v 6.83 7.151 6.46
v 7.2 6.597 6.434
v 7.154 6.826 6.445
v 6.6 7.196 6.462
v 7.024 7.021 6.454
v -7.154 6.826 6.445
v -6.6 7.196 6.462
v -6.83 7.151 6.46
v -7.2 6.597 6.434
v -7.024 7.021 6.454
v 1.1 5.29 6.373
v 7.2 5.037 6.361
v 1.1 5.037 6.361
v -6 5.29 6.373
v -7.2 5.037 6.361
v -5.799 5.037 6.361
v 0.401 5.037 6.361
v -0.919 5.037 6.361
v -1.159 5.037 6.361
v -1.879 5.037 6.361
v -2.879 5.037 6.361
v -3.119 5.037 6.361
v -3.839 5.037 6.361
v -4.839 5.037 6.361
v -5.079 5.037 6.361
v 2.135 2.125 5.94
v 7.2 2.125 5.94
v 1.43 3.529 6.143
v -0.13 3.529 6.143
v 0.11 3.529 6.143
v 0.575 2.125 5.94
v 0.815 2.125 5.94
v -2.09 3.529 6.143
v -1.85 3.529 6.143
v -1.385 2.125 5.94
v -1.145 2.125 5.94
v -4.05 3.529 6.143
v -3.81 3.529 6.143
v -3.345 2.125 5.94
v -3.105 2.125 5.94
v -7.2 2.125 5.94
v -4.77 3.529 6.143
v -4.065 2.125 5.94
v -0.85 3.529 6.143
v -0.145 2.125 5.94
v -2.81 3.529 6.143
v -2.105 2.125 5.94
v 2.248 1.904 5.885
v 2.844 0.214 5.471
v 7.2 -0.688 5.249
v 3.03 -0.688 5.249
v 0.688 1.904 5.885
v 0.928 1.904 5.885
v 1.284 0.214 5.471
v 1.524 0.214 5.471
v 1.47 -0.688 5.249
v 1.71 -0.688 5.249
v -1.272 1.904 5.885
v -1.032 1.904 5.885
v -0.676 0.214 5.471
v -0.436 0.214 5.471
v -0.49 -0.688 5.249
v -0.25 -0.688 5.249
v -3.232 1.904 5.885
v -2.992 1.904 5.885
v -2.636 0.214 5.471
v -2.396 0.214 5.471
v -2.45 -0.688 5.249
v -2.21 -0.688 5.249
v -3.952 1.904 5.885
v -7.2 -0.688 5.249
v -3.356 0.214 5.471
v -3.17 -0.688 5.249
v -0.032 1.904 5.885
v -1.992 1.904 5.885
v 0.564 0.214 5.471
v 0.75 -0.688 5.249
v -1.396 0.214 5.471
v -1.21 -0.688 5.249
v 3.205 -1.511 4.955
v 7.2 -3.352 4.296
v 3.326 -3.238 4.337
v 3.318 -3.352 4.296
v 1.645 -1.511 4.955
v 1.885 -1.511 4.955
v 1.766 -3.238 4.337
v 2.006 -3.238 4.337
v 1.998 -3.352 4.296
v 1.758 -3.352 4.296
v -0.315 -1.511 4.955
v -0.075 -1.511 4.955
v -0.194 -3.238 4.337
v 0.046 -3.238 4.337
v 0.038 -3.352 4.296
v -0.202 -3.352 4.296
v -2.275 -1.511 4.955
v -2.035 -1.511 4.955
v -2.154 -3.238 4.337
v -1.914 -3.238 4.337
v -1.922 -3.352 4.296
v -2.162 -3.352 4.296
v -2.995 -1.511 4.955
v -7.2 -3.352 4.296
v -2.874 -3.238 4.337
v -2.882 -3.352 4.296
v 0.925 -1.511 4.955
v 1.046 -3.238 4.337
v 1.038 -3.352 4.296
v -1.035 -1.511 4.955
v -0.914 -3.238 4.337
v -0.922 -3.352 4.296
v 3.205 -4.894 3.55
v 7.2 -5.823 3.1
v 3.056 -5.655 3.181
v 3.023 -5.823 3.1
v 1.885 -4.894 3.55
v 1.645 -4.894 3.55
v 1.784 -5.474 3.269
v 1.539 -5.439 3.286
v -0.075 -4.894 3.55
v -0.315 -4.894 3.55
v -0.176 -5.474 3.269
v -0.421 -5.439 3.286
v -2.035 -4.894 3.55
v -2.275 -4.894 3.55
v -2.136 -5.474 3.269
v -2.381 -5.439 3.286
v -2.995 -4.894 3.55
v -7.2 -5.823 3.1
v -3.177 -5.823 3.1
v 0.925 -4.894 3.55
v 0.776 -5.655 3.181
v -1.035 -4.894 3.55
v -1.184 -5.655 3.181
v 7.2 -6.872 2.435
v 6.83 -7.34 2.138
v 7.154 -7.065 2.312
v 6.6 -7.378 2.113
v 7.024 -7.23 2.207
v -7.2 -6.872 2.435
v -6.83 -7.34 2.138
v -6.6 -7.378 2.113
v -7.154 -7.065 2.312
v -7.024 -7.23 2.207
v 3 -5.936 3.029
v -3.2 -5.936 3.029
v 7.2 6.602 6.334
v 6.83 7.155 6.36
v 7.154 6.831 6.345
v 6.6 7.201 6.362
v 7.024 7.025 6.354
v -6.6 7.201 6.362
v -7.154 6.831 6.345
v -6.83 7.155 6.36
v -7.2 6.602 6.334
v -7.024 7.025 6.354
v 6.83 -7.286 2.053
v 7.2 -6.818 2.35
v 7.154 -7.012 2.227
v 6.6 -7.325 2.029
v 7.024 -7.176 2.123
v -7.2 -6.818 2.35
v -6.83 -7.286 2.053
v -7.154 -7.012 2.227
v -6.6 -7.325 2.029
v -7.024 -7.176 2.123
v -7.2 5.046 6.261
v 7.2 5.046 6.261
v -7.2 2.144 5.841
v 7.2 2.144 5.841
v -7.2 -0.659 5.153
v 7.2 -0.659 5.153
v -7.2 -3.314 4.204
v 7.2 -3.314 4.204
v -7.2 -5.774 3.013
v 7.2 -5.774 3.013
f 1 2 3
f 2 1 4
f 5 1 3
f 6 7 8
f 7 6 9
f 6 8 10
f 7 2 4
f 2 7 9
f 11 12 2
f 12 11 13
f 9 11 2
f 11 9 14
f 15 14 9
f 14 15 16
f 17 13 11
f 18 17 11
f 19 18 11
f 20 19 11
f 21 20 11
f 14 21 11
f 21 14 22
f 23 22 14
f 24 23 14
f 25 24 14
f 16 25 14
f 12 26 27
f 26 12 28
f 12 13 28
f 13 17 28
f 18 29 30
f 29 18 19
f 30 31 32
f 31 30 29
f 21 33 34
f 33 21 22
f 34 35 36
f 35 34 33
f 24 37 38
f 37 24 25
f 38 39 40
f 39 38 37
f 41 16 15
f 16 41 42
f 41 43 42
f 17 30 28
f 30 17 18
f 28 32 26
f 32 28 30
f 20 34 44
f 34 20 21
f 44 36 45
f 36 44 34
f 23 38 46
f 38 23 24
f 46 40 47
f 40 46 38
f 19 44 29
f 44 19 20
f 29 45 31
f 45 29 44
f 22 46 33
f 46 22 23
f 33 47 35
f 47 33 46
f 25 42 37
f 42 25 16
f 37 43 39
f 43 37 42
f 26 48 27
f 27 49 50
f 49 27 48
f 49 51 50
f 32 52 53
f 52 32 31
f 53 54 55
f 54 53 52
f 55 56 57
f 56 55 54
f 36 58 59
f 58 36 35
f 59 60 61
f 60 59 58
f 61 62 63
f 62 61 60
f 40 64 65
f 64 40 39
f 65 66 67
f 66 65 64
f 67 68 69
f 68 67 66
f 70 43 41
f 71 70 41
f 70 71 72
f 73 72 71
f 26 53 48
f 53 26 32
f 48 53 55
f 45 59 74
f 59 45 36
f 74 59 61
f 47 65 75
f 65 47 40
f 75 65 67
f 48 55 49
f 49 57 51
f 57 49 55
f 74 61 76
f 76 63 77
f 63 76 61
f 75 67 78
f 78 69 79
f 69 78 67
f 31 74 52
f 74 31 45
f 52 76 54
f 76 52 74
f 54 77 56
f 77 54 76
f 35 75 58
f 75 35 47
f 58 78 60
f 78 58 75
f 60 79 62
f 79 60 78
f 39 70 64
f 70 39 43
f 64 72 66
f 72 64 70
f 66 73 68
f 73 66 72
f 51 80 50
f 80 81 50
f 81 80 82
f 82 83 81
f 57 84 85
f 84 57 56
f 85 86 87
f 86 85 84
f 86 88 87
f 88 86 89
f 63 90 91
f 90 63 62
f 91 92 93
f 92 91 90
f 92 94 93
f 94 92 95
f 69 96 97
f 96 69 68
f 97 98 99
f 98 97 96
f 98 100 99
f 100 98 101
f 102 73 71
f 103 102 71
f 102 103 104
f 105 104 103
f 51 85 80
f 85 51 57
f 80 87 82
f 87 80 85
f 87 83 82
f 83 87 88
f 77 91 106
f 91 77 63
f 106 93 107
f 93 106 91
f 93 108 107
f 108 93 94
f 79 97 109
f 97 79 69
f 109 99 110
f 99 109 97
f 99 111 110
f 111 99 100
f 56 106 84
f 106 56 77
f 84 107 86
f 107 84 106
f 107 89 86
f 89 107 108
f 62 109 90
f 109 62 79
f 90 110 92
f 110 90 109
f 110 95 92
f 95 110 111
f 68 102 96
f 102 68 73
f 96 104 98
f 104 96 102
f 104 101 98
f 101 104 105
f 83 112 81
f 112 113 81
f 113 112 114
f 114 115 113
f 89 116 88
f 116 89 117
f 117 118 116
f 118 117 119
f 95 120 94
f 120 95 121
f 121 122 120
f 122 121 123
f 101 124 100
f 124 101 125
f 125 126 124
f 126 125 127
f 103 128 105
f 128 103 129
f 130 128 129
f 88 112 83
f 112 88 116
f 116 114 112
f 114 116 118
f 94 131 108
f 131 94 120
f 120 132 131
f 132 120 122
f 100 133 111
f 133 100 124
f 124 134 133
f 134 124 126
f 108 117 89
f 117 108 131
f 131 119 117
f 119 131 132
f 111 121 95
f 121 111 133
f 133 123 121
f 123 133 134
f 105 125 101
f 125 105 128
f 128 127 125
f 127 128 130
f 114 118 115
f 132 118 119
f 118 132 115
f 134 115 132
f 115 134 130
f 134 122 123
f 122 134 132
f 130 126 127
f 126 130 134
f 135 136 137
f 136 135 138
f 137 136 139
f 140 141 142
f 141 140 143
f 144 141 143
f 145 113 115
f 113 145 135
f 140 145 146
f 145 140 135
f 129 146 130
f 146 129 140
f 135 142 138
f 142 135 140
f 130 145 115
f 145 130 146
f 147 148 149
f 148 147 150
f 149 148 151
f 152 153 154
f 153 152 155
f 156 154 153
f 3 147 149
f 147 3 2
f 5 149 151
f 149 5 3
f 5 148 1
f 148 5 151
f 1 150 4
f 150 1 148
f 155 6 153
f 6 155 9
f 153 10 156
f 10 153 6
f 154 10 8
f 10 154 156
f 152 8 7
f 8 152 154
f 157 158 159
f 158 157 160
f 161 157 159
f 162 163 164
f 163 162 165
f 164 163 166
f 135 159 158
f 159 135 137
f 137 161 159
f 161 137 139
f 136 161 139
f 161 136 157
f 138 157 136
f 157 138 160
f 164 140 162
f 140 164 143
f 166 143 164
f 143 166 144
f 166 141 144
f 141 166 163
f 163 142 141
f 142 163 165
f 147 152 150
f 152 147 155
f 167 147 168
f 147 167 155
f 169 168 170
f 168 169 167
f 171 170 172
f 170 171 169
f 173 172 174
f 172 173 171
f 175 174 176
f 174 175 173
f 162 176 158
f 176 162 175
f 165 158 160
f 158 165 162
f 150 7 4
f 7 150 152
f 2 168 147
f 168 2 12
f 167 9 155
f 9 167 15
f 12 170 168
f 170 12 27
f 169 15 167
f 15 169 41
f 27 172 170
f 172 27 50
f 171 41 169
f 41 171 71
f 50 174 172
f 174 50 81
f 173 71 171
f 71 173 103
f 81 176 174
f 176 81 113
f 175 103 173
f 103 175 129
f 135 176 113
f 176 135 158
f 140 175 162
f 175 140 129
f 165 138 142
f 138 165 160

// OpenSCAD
// file: ../p/1-4cyli.scad
use <../lib.scad>
function ldraw_lib__1_4cyli() = [
// 0 Cylinder 0.25
// 0 Name: 1-4cyli.dat
// 0 Author: James Jessiman
// 0 !LDRAW_ORG Primitive UPDATE 2012-01
// 0 !LICENSE Licensed under CC BY 4.0 : see CAreadme.txt
// 
// 0 BFC CERTIFY CCW
  [0,"BFC","CERTIFY"],
  [0,"BFC","CCW"],
// 
// 0 !HISTORY 2002-03-23 [sbliss] Added BFC statement.
// 0 !HISTORY 2002-04-25 [PTadmin] Official Update 2002-02
// 0 !HISTORY 2007-06-22 [PTadmin] Header formatted for Contributor Agreement
// 0 !HISTORY 2008-07-01 [PTadmin] Official Update 2008-01
// 0 !HISTORY 2012-02-16 [Philo] Changed to CCW
// 0 !HISTORY 2012-03-30 [PTadmin] Official Update 2012-01
// 
// 
// 4 16 1 1 0 0.9239 1 0.3827 0.9239 0 0.3827 1 0 0
  [4,16,1,1,0,0.9239,1,0.3827,0.9239,0,0.3827,1,0,0],
// 5 24 1 0 0 1 1 0 0.9239 0 0.3827 1 0 -1
  [5,24,1,0,0,1,1,0,0.9239,0,0.3827,1,0,-1],
// 4 16 0.9239 1 0.3827 0.7071 1 0.7071 0.7071 0 0.7071 0.9239 0 0.3827
  [4,16,0.9239,1,0.3827,0.7071,1,0.7071,0.7071,0,0.7071,0.9239,0,0.3827],
// 5 24 0.9239 0 0.3827 0.9239 1 0.3827 0.7071 0 0.7071 1 0 0
  [5,24,0.9239,0,0.3827,0.9239,1,0.3827,0.7071,0,0.7071,1,0,0],
// 4 16 0.7071 1 0.7071 0.3827 1 0.9239 0.3827 0 0.9239 0.7071 0 0.7071
  [4,16,0.7071,1,0.7071,0.3827,1,0.9239,0.3827,0,0.9239,0.7071,0,0.7071],
// 5 24 0.7071 0 0.7071 0.7071 1 0.7071 0.3827 0 0.9239 0.9239 0 0.3827
  [5,24,0.7071,0,0.7071,0.7071,1,0.7071,0.3827,0,0.9239,0.9239,0,0.3827],
// 4 16 0.3827 1 0.9239 0 1 1 0 0 1 0.3827 0 0.9239
  [4,16,0.3827,1,0.9239,0,1,1,0,0,1,0.3827,0,0.9239],
// 5 24 0.3827 0 0.9239 0.3827 1 0.9239 0 0 1 0.7071 0 0.7071
  [5,24,0.3827,0,0.9239,0.3827,1,0.9239,0,0,1,0.7071,0,0.7071],
// 5 24 0 0 1 0 1 1 0.3827 0 0.9239 -1 0 1
  [5,24,0,0,1,0,1,1,0.3827,0,0.9239,-1,0,1],
];
module ldraw_lib__1_4cyli(step=0, col=false, unit=2/5, alt=false, line=0.2, solid=!$preview)
    makepoly(ldraw_lib__1_4cyli(), step=step, col=col, unit=unit, alt=alt, line=line, solid=solid);
ldraw_lib__1_4cyli(line=0.2);
// file: ../p/1-4chrd.scad
use <../lib.scad>
function ldraw_lib__1_4chrd() = [
// 0 Chord 0.25
// 0 Name: 1-4chrd.dat
// 0 Author: Max Martin Richter [MMR1988]
// 0 !LDRAW_ORG Primitive UPDATE 2023-05
// 0 !LICENSE Licensed under CC BY 4.0 : see CAreadme.txt
// 
// 0 BFC CERTIFY CCW
  [0,"BFC","CERTIFY"],
  [0,"BFC","CCW"],
// 
// 0 !HISTORY 2004-04-22 [PTadmin] Official Update 2004-02
// 0 !HISTORY 2007-10-09 [PTadmin] Header formatted for Contributor Agreement
// 0 !HISTORY 2008-07-01 [PTadmin] Official Update 2008-01
// 0 !HISTORY 2012-08-02 [MMR1988] Re-creation with PrimGen2 and Rectifier
// 0 !HISTORY 2012-08-09 [PTadmin] Official Update 2012-02
// 0 !HISTORY 2023-10-27 [OrionP] Change author to MMR1988 from hafhead
// 0 !HISTORY 2023-10-31 [OrionP] Official Update 2023-05
// 
// 4 16 0.9239 0 0.3827 0.3827 0 0.9239 0 0 1 1 0 0
  [4,16,0.9239,0,0.3827,0.3827,0,0.9239,0,0,1,1,0,0],
// 3 16 0.7071 0 0.7071 0.3827 0 0.9239 0.9239 0 0.3827
  [3,16,0.7071,0,0.7071,0.3827,0,0.9239,0.9239,0,0.3827],
];
module ldraw_lib__1_4chrd(step=0, col=false, unit=2/5, alt=false, line=0.2, solid=!$preview)
    makepoly(ldraw_lib__1_4chrd(), step=step, col=col, unit=unit, alt=alt, line=line, solid=solid);
ldraw_lib__1_4chrd(line=0.2);
// file: s/6142617ss06.scad
use <../../lib.scad>
use <../../p/1-4chrd.scad>
function ldraw_lib__s__6142617ss06() = [
// 0 ~Sticker  1.9 x  1.8 with Silver Air Vents on Black Background Left - Sixth Face
// 0 Name: s\6142617ss06.dat
// 0 Author: Massimo Maso [Sirio]
// 0 !LDRAW_ORG Subpart UPDATE 2023-05
// 0 !LICENSE Licensed under CC BY 4.0 : see CAreadme.txt
// 
// 0 BFC CERTIFY CCW
  [0,"BFC","CERTIFY"],
  [0,"BFC","CCW"],
// 
// 0 !HISTORY 2023-10-31 [OrionP] Official Update 2023-05
// 
// 
// 0 // Primitives
// 1 0 -16.5 -.25 -3.0901 -1.5 0 0 0 1 0 0 0 -1.5 1-4chrd.dat
  [1,0,-16.5,-.25,-3.0901,-1.5,0,0,0,1,0,0,0,-1.5, ldraw_lib__1_4chrd()],
// 1 0 16.5 -.25 -3.0901 1.5 0 0 0 1 0 0 0 -1.5 1-4chrd.dat
  [1,0,16.5,-.25,-3.0901,1.5,0,0,0,1,0,0,0,-1.5, ldraw_lib__1_4chrd()],
// 0 // Black faces
// 4 0 -18 -.25 -3.0901 -7.5 -.25 -.319 -7.5587 -.25 .0144 -18 -.25 .0144
  [4,0,-18,-.25,-3.0901,-7.5,-.25,-.319,-7.5587,-.25,.0144,-18,-.25,.0144],
// 4 0 -18 -.25 -3.0901 18 -.25 -3.0901 8 -.25 -.319 -7.5 -.25 -.319
  [4,0,-18,-.25,-3.0901,18,-.25,-3.0901,8,-.25,-.319,-7.5,-.25,-.319],
// 4 0 18 -.25 -3.0901 18 -.25 .0144 7.9413 -.25 .0144 8 -.25 -.319
  [4,0,18,-.25,-3.0901,18,-.25,.0144,7.9413,-.25,.0144,8,-.25,-.319],
// 4 0 18 -.25 -3.0901 -18 -.25 -3.0901 -16.5 -.25 -4.5901 16.5 -.25 -4.5901
  [4,0,18,-.25,-3.0901,-18,-.25,-3.0901,-16.5,-.25,-4.5901,16.5,-.25,-4.5901],
// 0 // Silver face
// 4 80 -7.5587 -.25 .0144 -7.5 -.25 -.319 8 -.25 -.319 7.9413 -.25 .0144
  [4,80,-7.5587,-.25,.0144,-7.5,-.25,-.319,8,-.25,-.319,7.9413,-.25,.0144],
];
module ldraw_lib__s__6142617ss06(step=0, col=false, unit=2/5, alt=false, line=0.2, solid=!$preview)
    makepoly(ldraw_lib__s__6142617ss06(), step=step, col=col, unit=unit, alt=alt, line=line, solid=solid);
ldraw_lib__s__6142617ss06(line=0.2);
// file: s/6142617ss05.scad
use <../../lib.scad>
function ldraw_lib__s__6142617ss05() = [
// 0 ~Sticker  1.9 x  1.8 with Silver Air Vents on Black Background Left - Fifth Face
// 0 Name: s\6142617ss05.dat
// 0 Author: Massimo Maso [Sirio]
// 0 !LDRAW_ORG Subpart UPDATE 2023-05
// 0 !LICENSE Licensed under CC BY 4.0 : see CAreadme.txt
// 
// 0 BFC CERTIFY CCW
  [0,"BFC","CERTIFY"],
  [0,"BFC","CCW"],
// 
// 0 !HISTORY 2023-10-31 [OrionP] Official Update 2023-05
// 
// 
// 0 // Black faces
// 3 0 -18 -.25 6.8484 -8.0132 -.25 2.5659 -8.2961 -.25 6.8484
  [3,0,-18,-.25,6.8484,-8.0132,-.25,2.5659,-8.2961,-.25,6.8484],
// 4 0 -18 -.25 6.8484 -18 -.25 -.0144 -7.6409 -.25 .4522 -8.0132 -.25 2.5659
  [4,0,-18,-.25,6.8484,-18,-.25,-.0144,-7.6409,-.25,.4522,-8.0132,-.25,2.5659],
// 3 0 -18 -.25 -.0144 -7.5587 -.25 -.0144 -7.6409 -.25 .4522
  [3,0,-18,-.25,-.0144,-7.5587,-.25,-.0144,-7.6409,-.25,.4522],
// 4 0 -4.7132 -.25 2.5659 -4.1132 -.25 2.5659 -4.3961 -.25 6.8484 -4.9961 -.25 6.8484
  [4,0,-4.7132,-.25,2.5659,-4.1132,-.25,2.5659,-4.3961,-.25,6.8484,-4.9961,-.25,6.8484],
// 4 0 -4.7132 -.25 2.5659 -4.461 -.25 .955 -3.8466 -.25 1.0522 -4.1132 -.25 2.5659
  [4,0,-4.7132,-.25,2.5659,-4.461,-.25,.955,-3.8466,-.25,1.0522,-4.1132,-.25,2.5659],
// 4 0 .1868 -.25 2.5659 .7868 -.25 2.5659 .5039 -.25 6.8484 -.0961 -.25 6.8484
  [4,0,.1868,-.25,2.5659,.7868,-.25,2.5659,.5039,-.25,6.8484,-.0961,-.25,6.8484],
// 4 0 .1868 -.25 2.5659 .439 -.25 .955 1.0534 -.25 1.0522 .7868 -.25 2.5659
  [4,0,.1868,-.25,2.5659,.439,-.25,.955,1.0534,-.25,1.0522,.7868,-.25,2.5659],
// 4 0 5.0868 -.25 2.5659 5.6868 -.25 2.5659 5.4039 -.25 6.8484 4.8039 -.25 6.8484
  [4,0,5.0868,-.25,2.5659,5.6868,-.25,2.5659,5.4039,-.25,6.8484,4.8039,-.25,6.8484],
// 4 0 5.0868 -.25 2.5659 5.339 -.25 .955 5.9534 -.25 1.0522 5.6868 -.25 2.5659
  [4,0,5.0868,-.25,2.5659,5.339,-.25,.955,5.9534,-.25,1.0522,5.6868,-.25,2.5659],
// 4 0 18 -.25 -.0144 18 -.25 6.8484 7.2039 -.25 6.8484 7.4868 -.25 2.5659
  [4,0,18,-.25,-.0144,18,-.25,6.8484,7.2039,-.25,6.8484,7.4868,-.25,2.5659],
// 3 0 18 -.25 -.0144 7.4868 -.25 2.5659 7.9413 -.25 -.0144
  [3,0,18,-.25,-.0144,7.4868,-.25,2.5659,7.9413,-.25,-.0144],
// 0 // Grey faces
// 4 71 -8.0132 -.25 2.5659 -4.7132 -.25 2.5659 -4.9961 -.25 6.8484 -8.2961 -.25 6.8484
  [4,71,-8.0132,-.25,2.5659,-4.7132,-.25,2.5659,-4.9961,-.25,6.8484,-8.2961,-.25,6.8484],
// 4 71 -8.0132 -.25 2.5659 -7.6409 -.25 .4522 -4.461 -.25 .955 -4.7132 -.25 2.5659
  [4,71,-8.0132,-.25,2.5659,-7.6409,-.25,.4522,-4.461,-.25,.955,-4.7132,-.25,2.5659],
// 4 71 -2.3132 -.25 2.5659 .1868 -.25 2.5659 -.0961 -.25 6.8484 -2.5961 -.25 6.8484
  [4,71,-2.3132,-.25,2.5659,.1868,-.25,2.5659,-.0961,-.25,6.8484,-2.5961,-.25,6.8484],
// 4 71 -2.3132 -.25 2.5659 -1.9409 -.25 .4522 .439 -.25 .955 .1868 -.25 2.5659
  [4,71,-2.3132,-.25,2.5659,-1.9409,-.25,.4522,.439,-.25,.955,.1868,-.25,2.5659],
// 4 71 2.5868 -.25 2.5659 5.0868 -.25 2.5659 4.8039 -.25 6.8484 2.3039 -.25 6.8484
  [4,71,2.5868,-.25,2.5659,5.0868,-.25,2.5659,4.8039,-.25,6.8484,2.3039,-.25,6.8484],
// 4 71 2.5868 -.25 2.5659 2.9591 -.25 .4522 5.339 -.25 .955 5.0868 -.25 2.5659
  [4,71,2.5868,-.25,2.5659,2.9591,-.25,.4522,5.339,-.25,.955,5.0868,-.25,2.5659],
// 0 // Silver faces
// 4 80 -4.1132 -.25 2.5659 -2.3132 -.25 2.5659 -2.5961 -.25 6.8484 -4.3961 -.25 6.8484
  [4,80,-4.1132,-.25,2.5659,-2.3132,-.25,2.5659,-2.5961,-.25,6.8484,-4.3961,-.25,6.8484],
// 4 80 -4.1132 -.25 2.5659 -3.8466 -.25 1.0522 -1.9409 -.25 .4522 -2.3132 -.25 2.5659
  [4,80,-4.1132,-.25,2.5659,-3.8466,-.25,1.0522,-1.9409,-.25,.4522,-2.3132,-.25,2.5659],
// 4 80 .7868 -.25 2.5659 2.5868 -.25 2.5659 2.3039 -.25 6.8484 .5039 -.25 6.8484
  [4,80,.7868,-.25,2.5659,2.5868,-.25,2.5659,2.3039,-.25,6.8484,.5039,-.25,6.8484],
// 4 80 .7868 -.25 2.5659 1.0534 -.25 1.0522 2.9591 -.25 .4522 2.5868 -.25 2.5659
  [4,80,.7868,-.25,2.5659,1.0534,-.25,1.0522,2.9591,-.25,.4522,2.5868,-.25,2.5659],
// 4 80 5.6868 -.25 2.5659 7.4868 -.25 2.5659 7.2039 -.25 6.8484 5.4039 -.25 6.8484
  [4,80,5.6868,-.25,2.5659,7.4868,-.25,2.5659,7.2039,-.25,6.8484,5.4039,-.25,6.8484],
// 4 80 5.6868 -.25 2.5659 5.9534 -.25 1.0522 7.9413 -.25 -.0144 7.4868 -.25 2.5659
  [4,80,5.6868,-.25,2.5659,5.9534,-.25,1.0522,7.9413,-.25,-.0144,7.4868,-.25,2.5659],
// 3 80 -7.5587 -.25 -.0144 -4.461 -.25 .955 -7.6409 -.25 .4522
  [3,80,-7.5587,-.25,-.0144,-4.461,-.25,.955,-7.6409,-.25,.4522],
// 4 80 -7.5587 -.25 -.0144 -1.9409 -.25 .4522 -3.8466 -.25 1.0522 -4.461 -.25 .955
  [4,80,-7.5587,-.25,-.0144,-1.9409,-.25,.4522,-3.8466,-.25,1.0522,-4.461,-.25,.955],
// 4 80 -7.5587 -.25 -.0144 7.9413 -.25 -.0144 2.9591 -.25 .4522 -1.9409 -.25 .4522
  [4,80,-7.5587,-.25,-.0144,7.9413,-.25,-.0144,2.9591,-.25,.4522,-1.9409,-.25,.4522],
// 4 80 2.9591 -.25 .4522 1.0534 -.25 1.0522 .439 -.25 .955 -1.9409 -.25 .4522
  [4,80,2.9591,-.25,.4522,1.0534,-.25,1.0522,.439,-.25,.955,-1.9409,-.25,.4522],
// 4 80 2.9591 -.25 .4522 7.9413 -.25 -.0144 5.9534 -.25 1.0522 5.339 -.25 .955
  [4,80,2.9591,-.25,.4522,7.9413,-.25,-.0144,5.9534,-.25,1.0522,5.339,-.25,.955],
];
module ldraw_lib__s__6142617ss05(step=0, col=false, unit=2/5, alt=false, line=0.2, solid=!$preview)
    makepoly(ldraw_lib__s__6142617ss05(), step=step, col=col, unit=unit, alt=alt, line=line, solid=solid);
ldraw_lib__s__6142617ss05(line=0.2);
// file: s/6142617ss04.scad
use <../../lib.scad>
function ldraw_lib__s__6142617ss04() = [
// 0 ~Sticker  1.9 x  1.8 with Silver Air Vents on Black Background Left - Fourth Face
// 0 Name: s\6142617ss04.dat
// 0 Author: Massimo Maso [Sirio]
// 0 !LDRAW_ORG Subpart UPDATE 2023-05
// 0 !LICENSE Licensed under CC BY 4.0 : see CAreadme.txt
// 
// 0 BFC CERTIFY CCW
  [0,"BFC","CERTIFY"],
  [0,"BFC","CCW"],
// 
// 0 !HISTORY 2023-10-31 [OrionP] Official Update 2023-05
// 
// 
// 0 // Black faces
// 3 0 -18 -.25 .0128 -8.0132 -.25 -2.1709 -7.5754 -.25 .0128
  [3,0,-18,-.25,.0128,-8.0132,-.25,-2.1709,-7.5754,-.25,.0128],
// 4 0 -18 -.25 .0128 -18 -.25 -7.061 -8.3161 -.25 -6.7572 -8.0132 -.25 -2.1709
  [4,0,-18,-.25,.0128,-18,-.25,-7.061,-8.3161,-.25,-6.7572,-8.0132,-.25,-2.1709],
// 3 0 -18 -.25 -7.061 -8.2961 -.25 -7.061 -8.3161 -.25 -6.7572
  [3,0,-18,-.25,-7.061,-8.2961,-.25,-7.061,-8.3161,-.25,-6.7572],
// 4 0 -4.7132 -.25 -2.1709 -4.1132 -.25 -2.1709 -3.6754 -.25 .0128 -4.2754 -.25 .0128
  [4,0,-4.7132,-.25,-2.1709,-4.1132,-.25,-2.1709,-3.6754,-.25,.0128,-4.2754,-.25,.0128],
// 4 0 -4.7132 -.25 -2.1709 -5.0161 -.25 -6.7572 -4.4161 -.25 -6.7572 -4.1132 -.25 -2.1709
  [4,0,-4.7132,-.25,-2.1709,-5.0161,-.25,-6.7572,-4.4161,-.25,-6.7572,-4.1132,-.25,-2.1709],
// 4 0 -5.0161 -.25 -6.7572 -4.9961 -.25 -7.061 -4.3961 -.25 -7.061 -4.4161 -.25 -6.7572
  [4,0,-5.0161,-.25,-6.7572,-4.9961,-.25,-7.061,-4.3961,-.25,-7.061,-4.4161,-.25,-6.7572],
// 4 0 .1868 -.25 -2.1709 .7868 -.25 -2.1709 1.2246 -.25 .0128 .6246 -.25 .0128
  [4,0,.1868,-.25,-2.1709,.7868,-.25,-2.1709,1.2246,-.25,.0128,.6246,-.25,.0128],
// 4 0 .1868 -.25 -2.1709 -.1161 -.25 -6.7572 .4839 -.25 -6.7572 .7868 -.25 -2.1709
  [4,0,.1868,-.25,-2.1709,-.1161,-.25,-6.7572,.4839,-.25,-6.7572,.7868,-.25,-2.1709],
// 4 0 -.1161 -.25 -6.7572 -.0961 -.25 -7.061 .5039 -.25 -7.061 .4839 -.25 -6.7572
  [4,0,-.1161,-.25,-6.7572,-.0961,-.25,-7.061,.5039,-.25,-7.061,.4839,-.25,-6.7572],
// 4 0 5.0868 -.25 -2.1709 5.6868 -.25 -2.1709 6.1246 -.25 .0128 5.5246 -.25 .0128
  [4,0,5.0868,-.25,-2.1709,5.6868,-.25,-2.1709,6.1246,-.25,.0128,5.5246,-.25,.0128],
// 4 0 5.0868 -.25 -2.1709 4.7839 -.25 -6.7572 5.3839 -.25 -6.7572 5.6868 -.25 -2.1709
  [4,0,5.0868,-.25,-2.1709,4.7839,-.25,-6.7572,5.3839,-.25,-6.7572,5.6868,-.25,-2.1709],
// 4 0 4.7839 -.25 -6.7572 4.8039 -.25 -7.061 5.4039 -.25 -7.061 5.3839 -.25 -6.7572
  [4,0,4.7839,-.25,-6.7572,4.8039,-.25,-7.061,5.4039,-.25,-7.061,5.3839,-.25,-6.7572],
// 3 0 18 -.25 .0128 7.9246 -.25 .0128 7.4868 -.25 -2.1709
  [3,0,18,-.25,.0128,7.9246,-.25,.0128,7.4868,-.25,-2.1709],
// 4 0 18 -.25 -7.061 18 -.25 .0128 7.4868 -.25 -2.1709 7.1839 -.25 -6.7572
  [4,0,18,-.25,-7.061,18,-.25,.0128,7.4868,-.25,-2.1709,7.1839,-.25,-6.7572],
// 3 0 18 -.25 -7.061 7.1839 -.25 -6.7572 7.2039 -.25 -7.061
  [3,0,18,-.25,-7.061,7.1839,-.25,-6.7572,7.2039,-.25,-7.061],
// 0 // Grey faces
// 4 71 -8.0132 -.25 -2.1709 -4.7132 -.25 -2.1709 -4.2754 -.25 .0128 -7.5754 -.25 .0128
  [4,71,-8.0132,-.25,-2.1709,-4.7132,-.25,-2.1709,-4.2754,-.25,.0128,-7.5754,-.25,.0128],
// 4 71 -8.0132 -.25 -2.1709 -8.3161 -.25 -6.7572 -5.0161 -.25 -6.7572 -4.7132 -.25 -2.1709
  [4,71,-8.0132,-.25,-2.1709,-8.3161,-.25,-6.7572,-5.0161,-.25,-6.7572,-4.7132,-.25,-2.1709],
// 4 71 -8.3161 -.25 -6.7572 -8.2961 -.25 -7.061 -4.9961 -.25 -7.061 -5.0161 -.25 -6.7572
  [4,71,-8.3161,-.25,-6.7572,-8.2961,-.25,-7.061,-4.9961,-.25,-7.061,-5.0161,-.25,-6.7572],
// 4 71 -2.3132 -.25 -2.1709 .1868 -.25 -2.1709 .6246 -.25 .0128 -1.8754 -.25 .0128
  [4,71,-2.3132,-.25,-2.1709,.1868,-.25,-2.1709,.6246,-.25,.0128,-1.8754,-.25,.0128],
// 4 71 -2.3132 -.25 -2.1709 -2.6161 -.25 -6.7572 -.1161 -.25 -6.7572 .1868 -.25 -2.1709
  [4,71,-2.3132,-.25,-2.1709,-2.6161,-.25,-6.7572,-.1161,-.25,-6.7572,.1868,-.25,-2.1709],
// 4 71 -2.6161 -.25 -6.7572 -2.5961 -.25 -7.061 -.0961 -.25 -7.061 -.1161 -.25 -6.7572
  [4,71,-2.6161,-.25,-6.7572,-2.5961,-.25,-7.061,-.0961,-.25,-7.061,-.1161,-.25,-6.7572],
// 4 71 2.5868 -.25 -2.1709 5.0868 -.25 -2.1709 5.5246 -.25 .0128 3.0246 -.25 .0128
  [4,71,2.5868,-.25,-2.1709,5.0868,-.25,-2.1709,5.5246,-.25,.0128,3.0246,-.25,.0128],
// 4 71 2.5868 -.25 -2.1709 2.2839 -.25 -6.7572 4.7839 -.25 -6.7572 5.0868 -.25 -2.1709
  [4,71,2.5868,-.25,-2.1709,2.2839,-.25,-6.7572,4.7839,-.25,-6.7572,5.0868,-.25,-2.1709],
// 4 71 2.2839 -.25 -6.7572 2.3039 -.25 -7.061 4.8039 -.25 -7.061 4.7839 -.25 -6.7572
  [4,71,2.2839,-.25,-6.7572,2.3039,-.25,-7.061,4.8039,-.25,-7.061,4.7839,-.25,-6.7572],
// 0 // Silver faces
// 4 80 -4.1132 -.25 -2.1709 -2.3132 -.25 -2.1709 -1.8754 -.25 .0128 -3.6754 -.25 .0128
  [4,80,-4.1132,-.25,-2.1709,-2.3132,-.25,-2.1709,-1.8754,-.25,.0128,-3.6754,-.25,.0128],
// 4 80 -4.1132 -.25 -2.1709 -4.4161 -.25 -6.7572 -2.6161 -.25 -6.7572 -2.3132 -.25 -2.1709
  [4,80,-4.1132,-.25,-2.1709,-4.4161,-.25,-6.7572,-2.6161,-.25,-6.7572,-2.3132,-.25,-2.1709],
// 4 80 -4.4161 -.25 -6.7572 -4.3961 -.25 -7.061 -2.5961 -.25 -7.061 -2.6161 -.25 -6.7572
  [4,80,-4.4161,-.25,-6.7572,-4.3961,-.25,-7.061,-2.5961,-.25,-7.061,-2.6161,-.25,-6.7572],
// 4 80 .7868 -.25 -2.1709 2.5868 -.25 -2.1709 3.0246 -.25 .0128 1.2246 -.25 .0128
  [4,80,.7868,-.25,-2.1709,2.5868,-.25,-2.1709,3.0246,-.25,.0128,1.2246,-.25,.0128],
// 4 80 .7868 -.25 -2.1709 .4839 -.25 -6.7572 2.2839 -.25 -6.7572 2.5868 -.25 -2.1709
  [4,80,.7868,-.25,-2.1709,.4839,-.25,-6.7572,2.2839,-.25,-6.7572,2.5868,-.25,-2.1709],
// 4 80 .4839 -.25 -6.7572 .5039 -.25 -7.061 2.3039 -.25 -7.061 2.2839 -.25 -6.7572
  [4,80,.4839,-.25,-6.7572,.5039,-.25,-7.061,2.3039,-.25,-7.061,2.2839,-.25,-6.7572],
// 4 80 5.6868 -.25 -2.1709 7.4868 -.25 -2.1709 7.9246 -.25 .0128 6.1246 -.25 .0128
  [4,80,5.6868,-.25,-2.1709,7.4868,-.25,-2.1709,7.9246,-.25,.0128,6.1246,-.25,.0128],
// 4 80 5.6868 -.25 -2.1709 5.3839 -.25 -6.7572 7.1839 -.25 -6.7572 7.4868 -.25 -2.1709
  [4,80,5.6868,-.25,-2.1709,5.3839,-.25,-6.7572,7.1839,-.25,-6.7572,7.4868,-.25,-2.1709],
// 4 80 5.3839 -.25 -6.7572 5.4039 -.25 -7.061 7.2039 -.25 -7.061 7.1839 -.25 -6.7572
  [4,80,5.3839,-.25,-6.7572,5.4039,-.25,-7.061,7.2039,-.25,-7.061,7.1839,-.25,-6.7572],
];
module ldraw_lib__s__6142617ss04(step=0, col=false, unit=2/5, alt=false, line=0.2, solid=!$preview)
    makepoly(ldraw_lib__s__6142617ss04(), step=step, col=col, unit=unit, alt=alt, line=line, solid=solid);
ldraw_lib__s__6142617ss04(line=0.2);
// file: s/6142617ss03.scad
use <../../lib.scad>
function ldraw_lib__s__6142617ss03() = [
// 0 ~Sticker  1.9 x  1.8 with Silver Air Vents on Black Background Left - Third Face
// 0 Name: s\6142617ss03.dat
// 0 Author: Massimo Maso [Sirio]
// 0 !LDRAW_ORG Subpart UPDATE 2023-05
// 0 !LICENSE Licensed under CC BY 4.0 : see CAreadme.txt
// 
// 0 BFC CERTIFY CCW
  [0,"BFC","CERTIFY"],
  [0,"BFC","CCW"],
// 
// 0 !HISTORY 2023-10-31 [OrionP] Official Update 2023-05
// 
// 
// 0 // Black faces
// 3 0 -18 -.25 7.2284 -5.6212 -.25 6.6588 -5.3378 -.25 7.2284
  [3,0,-18,-.25,7.2284,-5.6212,-.25,6.6588,-5.3378,-.25,7.2284],
// 4 0 -18 -.25 7.2284 -18 -.25 -.0128 -7.1097 -.25 2.3102 -5.6212 -.25 6.6588
  [4,0,-18,-.25,7.2284,-18,-.25,-.0128,-7.1097,-.25,2.3102,-5.6212,-.25,6.6588],
// 3 0 -18 -.25 -.0128 -7.5754 -.25 -.0128 -7.1097 -.25 2.3102
  [3,0,-18,-.25,-.0128,-7.5754,-.25,-.0128,-7.1097,-.25,2.3102],
// 4 0 -2.3212 -.25 6.6588 -1.7212 -.25 6.6588 -1.4378 -.25 7.2284 -2.0378 -.25 7.2284
  [4,0,-2.3212,-.25,6.6588,-1.7212,-.25,6.6588,-1.4378,-.25,7.2284,-2.0378,-.25,7.2284],
// 4 0 -2.3212 -.25 6.6588 -3.8097 -.25 2.3102 -3.2097 -.25 2.3102 -1.7212 -.25 6.6588
  [4,0,-2.3212,-.25,6.6588,-3.8097,-.25,2.3102,-3.2097,-.25,2.3102,-1.7212,-.25,6.6588],
// 4 0 -3.8097 -.25 2.3102 -4.2754 -.25 -.0128 -3.6754 -.25 -.0128 -3.2097 -.25 2.3102
  [4,0,-3.8097,-.25,2.3102,-4.2754,-.25,-.0128,-3.6754,-.25,-.0128,-3.2097,-.25,2.3102],
// 4 0 2.5788 -.25 6.6588 3.1788 -.25 6.6588 3.4622 -.25 7.2284 2.8622 -.25 7.2284
  [4,0,2.5788,-.25,6.6588,3.1788,-.25,6.6588,3.4622,-.25,7.2284,2.8622,-.25,7.2284],
// 4 0 2.5788 -.25 6.6588 1.0903 -.25 2.3102 1.6903 -.25 2.3102 3.1788 -.25 6.6588
  [4,0,2.5788,-.25,6.6588,1.0903,-.25,2.3102,1.6903,-.25,2.3102,3.1788,-.25,6.6588],
// 4 0 1.0903 -.25 2.3102 .6246 -.25 -.0128 1.2246 -.25 -.0128 1.6903 -.25 2.3102
  [4,0,1.0903,-.25,2.3102,.6246,-.25,-.0128,1.2246,-.25,-.0128,1.6903,-.25,2.3102],
// 4 0 7.4788 -.25 6.6588 8.0788 -.25 6.6588 8.3622 -.25 7.2284 7.7622 -.25 7.2284
  [4,0,7.4788,-.25,6.6588,8.0788,-.25,6.6588,8.3622,-.25,7.2284,7.7622,-.25,7.2284],
// 4 0 7.4788 -.25 6.6588 5.9903 -.25 2.3102 6.5903 -.25 2.3102 8.0788 -.25 6.6588
  [4,0,7.4788,-.25,6.6588,5.9903,-.25,2.3102,6.5903,-.25,2.3102,8.0788,-.25,6.6588],
// 4 0 5.9903 -.25 2.3102 5.5246 -.25 -.0128 6.1246 -.25 -.0128 6.5903 -.25 2.3102
  [4,0,5.9903,-.25,2.3102,5.5246,-.25,-.0128,6.1246,-.25,-.0128,6.5903,-.25,2.3102],
// 3 0 18 -.25 7.2284 10.1622 -.25 7.2284 9.8788 -.25 6.6588
  [3,0,18,-.25,7.2284,10.1622,-.25,7.2284,9.8788,-.25,6.6588],
// 4 0 18 -.25 -.0128 18 -.25 7.2284 9.8788 -.25 6.6588 8.3903 -.25 2.3102
  [4,0,18,-.25,-.0128,18,-.25,7.2284,9.8788,-.25,6.6588,8.3903,-.25,2.3102],
// 3 0 18 -.25 -.0128 8.3903 -.25 2.3102 7.9246 -.25 -.0128
  [3,0,18,-.25,-.0128,8.3903,-.25,2.3102,7.9246,-.25,-.0128],
// 0 // Dark grey faces
// 4 72 -5.6212 -.25 6.6588 -2.3212 -.25 6.6588 -2.0378 -.25 7.2284 -5.3378 -.25 7.2284
  [4,72,-5.6212,-.25,6.6588,-2.3212,-.25,6.6588,-2.0378,-.25,7.2284,-5.3378,-.25,7.2284],
// 3 72 -3.8097 -.25 2.3102 -2.3212 -.25 6.6588 -5.6212 -.25 6.6588
  [3,72,-3.8097,-.25,2.3102,-2.3212,-.25,6.6588,-5.6212,-.25,6.6588],
// 4 72 .0788 -.25 6.6588 2.5788 -.25 6.6588 2.8622 -.25 7.2284 .3622 -.25 7.2284
  [4,72,.0788,-.25,6.6588,2.5788,-.25,6.6588,2.8622,-.25,7.2284,.3622,-.25,7.2284],
// 3 72 1.0903 -.25 2.3102 2.5788 -.25 6.6588 .0788 -.25 6.6588
  [3,72,1.0903,-.25,2.3102,2.5788,-.25,6.6588,.0788,-.25,6.6588],
// 4 72 4.9788 -.25 6.6588 7.4788 -.25 6.6588 7.7622 -.25 7.2284 5.2622 -.25 7.2284
  [4,72,4.9788,-.25,6.6588,7.4788,-.25,6.6588,7.7622,-.25,7.2284,5.2622,-.25,7.2284],
// 3 72 5.9903 -.25 2.3102 7.4788 -.25 6.6588 4.9788 -.25 6.6588
  [3,72,5.9903,-.25,2.3102,7.4788,-.25,6.6588,4.9788,-.25,6.6588],
// 0 // Grey faces
// 3 71 -7.1097 -.25 2.3102 -3.8097 -.25 2.3102 -5.6212 -.25 6.6588
  [3,71,-7.1097,-.25,2.3102,-3.8097,-.25,2.3102,-5.6212,-.25,6.6588],
// 4 71 -7.1097 -.25 2.3102 -7.5754 -.25 -.0128 -4.2754 -.25 -.0128 -3.8097 -.25 2.3102
  [4,71,-7.1097,-.25,2.3102,-7.5754,-.25,-.0128,-4.2754,-.25,-.0128,-3.8097,-.25,2.3102],
// 3 71 -1.4097 -.25 2.3102 1.0903 -.25 2.3102 .0788 -.25 6.6588
  [3,71,-1.4097,-.25,2.3102,1.0903,-.25,2.3102,.0788,-.25,6.6588],
// 4 71 -1.4097 -.25 2.3102 -1.8754 -.25 -.0128 .6246 -.25 -.0128 1.0903 -.25 2.3102
  [4,71,-1.4097,-.25,2.3102,-1.8754,-.25,-.0128,.6246,-.25,-.0128,1.0903,-.25,2.3102],
// 3 71 3.4903 -.25 2.3102 5.9903 -.25 2.3102 4.9788 -.25 6.6588
  [3,71,3.4903,-.25,2.3102,5.9903,-.25,2.3102,4.9788,-.25,6.6588],
// 4 71 3.4903 -.25 2.3102 3.0246 -.25 -.0128 5.5246 -.25 -.0128 5.9903 -.25 2.3102
  [4,71,3.4903,-.25,2.3102,3.0246,-.25,-.0128,5.5246,-.25,-.0128,5.9903,-.25,2.3102],
// 0 // Silver faces
// 4 80 -1.7212 -.25 6.6588 .0788 -.25 6.6588 .3622 -.25 7.2284 -1.4378 -.25 7.2284
  [4,80,-1.7212,-.25,6.6588,.0788,-.25,6.6588,.3622,-.25,7.2284,-1.4378,-.25,7.2284],
// 4 80 -1.7212 -.25 6.6588 -3.2097 -.25 2.3102 -1.4097 -.25 2.3102 .0788 -.25 6.6588
  [4,80,-1.7212,-.25,6.6588,-3.2097,-.25,2.3102,-1.4097,-.25,2.3102,.0788,-.25,6.6588],
// 4 80 -3.2097 -.25 2.3102 -3.6754 -.25 -.0128 -1.8754 -.25 -.0128 -1.4097 -.25 2.3102
  [4,80,-3.2097,-.25,2.3102,-3.6754,-.25,-.0128,-1.8754,-.25,-.0128,-1.4097,-.25,2.3102],
// 4 80 3.1788 -.25 6.6588 4.9788 -.25 6.6588 5.2622 -.25 7.2284 3.4622 -.25 7.2284
  [4,80,3.1788,-.25,6.6588,4.9788,-.25,6.6588,5.2622,-.25,7.2284,3.4622,-.25,7.2284],
// 4 80 3.1788 -.25 6.6588 1.6903 -.25 2.3102 3.4903 -.25 2.3102 4.9788 -.25 6.6588
  [4,80,3.1788,-.25,6.6588,1.6903,-.25,2.3102,3.4903,-.25,2.3102,4.9788,-.25,6.6588],
// 4 80 1.6903 -.25 2.3102 1.2246 -.25 -.0128 3.0246 -.25 -.0128 3.4903 -.25 2.3102
  [4,80,1.6903,-.25,2.3102,1.2246,-.25,-.0128,3.0246,-.25,-.0128,3.4903,-.25,2.3102],
// 4 80 8.0788 -.25 6.6588 9.8788 -.25 6.6588 10.1622 -.25 7.2284 8.3622 -.25 7.2284
  [4,80,8.0788,-.25,6.6588,9.8788,-.25,6.6588,10.1622,-.25,7.2284,8.3622,-.25,7.2284],
// 4 80 8.0788 -.25 6.6588 6.5903 -.25 2.3102 8.3903 -.25 2.3102 9.8788 -.25 6.6588
  [4,80,8.0788,-.25,6.6588,6.5903,-.25,2.3102,8.3903,-.25,2.3102,9.8788,-.25,6.6588],
// 4 80 6.5903 -.25 2.3102 6.1246 -.25 -.0128 7.9246 -.25 -.0128 8.3903 -.25 2.3102
  [4,80,6.5903,-.25,2.3102,6.1246,-.25,-.0128,7.9246,-.25,-.0128,8.3903,-.25,2.3102],
];
module ldraw_lib__s__6142617ss03(step=0, col=false, unit=2/5, alt=false, line=0.2, solid=!$preview)
    makepoly(ldraw_lib__s__6142617ss03(), step=step, col=col, unit=unit, alt=alt, line=line, solid=solid);
ldraw_lib__s__6142617ss03(line=0.2);
// file: s/6142617ss02.scad
use <../../lib.scad>
function ldraw_lib__s__6142617ss02() = [
// 0 ~Sticker  1.9 x  1.8 with Silver Air Vents on Black Background Left - Second Face
// 0 Name: s\6142617ss02.dat
// 0 Author: Massimo Maso [Sirio]
// 0 !LDRAW_ORG Subpart UPDATE 2023-05
// 0 !LICENSE Licensed under CC BY 4.0 : see CAreadme.txt
// 
// 0 BFC CERTIFY CCW
  [0,"BFC","CERTIFY"],
  [0,"BFC","CCW"],
// 
// 0 !HISTORY 2023-10-31 [OrionP] Official Update 2023-05
// 
// 
// 0 // Black faces
// 4 0 -3.5738 -.25 -3.798 -18 -.25 .0121 -18 -.25 -7.3435 -5.3378 -.25 -7.3435
  [4,0,-3.5738,-.25,-3.798,-18,-.25,.0121,-18,-.25,-7.3435,-5.3378,-.25,-7.3435],
// 3 0 -3.5738 -.25 -3.798 -2.75 -.25 .0121 -18 -.25 .0121
  [3,0,-3.5738,-.25,-3.798,-2.75,-.25,.0121,-18,-.25,.0121],
// 3 0 -3.5738 -.25 -3.798 -1.0028 -.25 .0121 -2.75 -.25 .0121
  [3,0,-3.5738,-.25,-3.798,-1.0028,-.25,.0121,-2.75,-.25,.0121],
// 4 0 -.2738 -.25 -3.798 .3262 -.25 -3.798 2.8972 -.25 .0121 2.2972 -.25 .0121
  [4,0,-.2738,-.25,-3.798,.3262,-.25,-3.798,2.8972,-.25,.0121,2.2972,-.25,.0121],
// 4 0 -.2738 -.25 -3.798 -2.0378 -.25 -7.3435 -1.4378 -.25 -7.3435 .3262 -.25 -3.798
  [4,0,-.2738,-.25,-3.798,-2.0378,-.25,-7.3435,-1.4378,-.25,-7.3435,.3262,-.25,-3.798],
// 4 0 4.6262 -.25 -3.798 5.2262 -.25 -3.798 7.7972 -.25 .0121 7.1972 -.25 .0121
  [4,0,4.6262,-.25,-3.798,5.2262,-.25,-3.798,7.7972,-.25,.0121,7.1972,-.25,.0121],
// 4 0 4.6262 -.25 -3.798 2.8622 -.25 -7.3435 3.4622 -.25 -7.3435 5.2262 -.25 -3.798
  [4,0,4.6262,-.25,-3.798,2.8622,-.25,-7.3435,3.4622,-.25,-7.3435,5.2262,-.25,-3.798],
// 4 0 9.5262 -.25 -3.798 10.1262 -.25 -3.798 12.6972 -.25 .0121 12.0972 -.25 .0121
  [4,0,9.5262,-.25,-3.798,10.1262,-.25,-3.798,12.6972,-.25,.0121,12.0972,-.25,.0121],
// 4 0 9.5262 -.25 -3.798 7.7622 -.25 -7.3435 8.3622 -.25 -7.3435 10.1262 -.25 -3.798
  [4,0,9.5262,-.25,-3.798,7.7622,-.25,-7.3435,8.3622,-.25,-7.3435,10.1262,-.25,-3.798],
// 4 0 11.9262 -.25 -3.798 18 -.25 -7.3435 18 -.25 .0121 14.4972 -.25 .0121
  [4,0,11.9262,-.25,-3.798,18,-.25,-7.3435,18,-.25,.0121,14.4972,-.25,.0121],
// 3 0 11.9262 -.25 -3.798 10.1622 -.25 -7.3435 18 -.25 -7.3435
  [3,0,11.9262,-.25,-3.798,10.1622,-.25,-7.3435,18,-.25,-7.3435],
// 0 // Dark grey faces
// 4 72 -3.5738 -.25 -3.798 -.2738 -.25 -3.798 2.2972 -.25 .0121 -1.0028 -.25 .0121
  [4,72,-3.5738,-.25,-3.798,-.2738,-.25,-3.798,2.2972,-.25,.0121,-1.0028,-.25,.0121],
// 4 72 -3.5738 -.25 -3.798 -5.3378 -.25 -7.3435 -2.0378 -.25 -7.3435 -.2738 -.25 -3.798
  [4,72,-3.5738,-.25,-3.798,-5.3378,-.25,-7.3435,-2.0378,-.25,-7.3435,-.2738,-.25,-3.798],
// 4 72 2.1262 -.25 -3.798 4.6262 -.25 -3.798 7.1972 -.25 .0121 4.6972 -.25 .0121
  [4,72,2.1262,-.25,-3.798,4.6262,-.25,-3.798,7.1972,-.25,.0121,4.6972,-.25,.0121],
// 4 72 2.1262 -.25 -3.798 .3622 -.25 -7.3435 2.8622 -.25 -7.3435 4.6262 -.25 -3.798
  [4,72,2.1262,-.25,-3.798,.3622,-.25,-7.3435,2.8622,-.25,-7.3435,4.6262,-.25,-3.798],
// 4 72 7.0262 -.25 -3.798 9.5262 -.25 -3.798 12.0972 -.25 .0121 9.5972 -.25 .0121
  [4,72,7.0262,-.25,-3.798,9.5262,-.25,-3.798,12.0972,-.25,.0121,9.5972,-.25,.0121],
// 4 72 7.0262 -.25 -3.798 5.2622 -.25 -7.3435 7.7622 -.25 -7.3435 9.5262 -.25 -3.798
  [4,72,7.0262,-.25,-3.798,5.2622,-.25,-7.3435,7.7622,-.25,-7.3435,9.5262,-.25,-3.798],
// 0 // Silver faces
// 4 80 .3262 -.25 -3.798 2.1262 -.25 -3.798 4.6972 -.25 .0121 2.8972 -.25 .0121
  [4,80,.3262,-.25,-3.798,2.1262,-.25,-3.798,4.6972,-.25,.0121,2.8972,-.25,.0121],
// 4 80 .3262 -.25 -3.798 -1.4378 -.25 -7.3435 .3622 -.25 -7.3435 2.1262 -.25 -3.798
  [4,80,.3262,-.25,-3.798,-1.4378,-.25,-7.3435,.3622,-.25,-7.3435,2.1262,-.25,-3.798],
// 4 80 5.2262 -.25 -3.798 7.0262 -.25 -3.798 9.5972 -.25 .0121 7.7972 -.25 .0121
  [4,80,5.2262,-.25,-3.798,7.0262,-.25,-3.798,9.5972,-.25,.0121,7.7972,-.25,.0121],
// 4 80 5.2262 -.25 -3.798 3.4622 -.25 -7.3435 5.2622 -.25 -7.3435 7.0262 -.25 -3.798
  [4,80,5.2262,-.25,-3.798,3.4622,-.25,-7.3435,5.2622,-.25,-7.3435,7.0262,-.25,-3.798],
// 4 80 10.1262 -.25 -3.798 11.9262 -.25 -3.798 14.4972 -.25 .0121 12.6972 -.25 .0121
  [4,80,10.1262,-.25,-3.798,11.9262,-.25,-3.798,14.4972,-.25,.0121,12.6972,-.25,.0121],
// 4 80 10.1262 -.25 -3.798 8.3622 -.25 -7.3435 10.1622 -.25 -7.3435 11.9262 -.25 -3.798
  [4,80,10.1262,-.25,-3.798,8.3622,-.25,-7.3435,10.1622,-.25,-7.3435,11.9262,-.25,-3.798],
];
module ldraw_lib__s__6142617ss02(step=0, col=false, unit=2/5, alt=false, line=0.2, solid=!$preview)
    makepoly(ldraw_lib__s__6142617ss02(), step=step, col=col, unit=unit, alt=alt, line=line, solid=solid);
ldraw_lib__s__6142617ss02(line=0.2);
// file: s/6142617ss01.scad
use <../../lib.scad>
use <../../p/1-4chrd.scad>
function ldraw_lib__s__6142617ss01() = [
// 0 ~Sticker  1.9 x  1.8 with Silver Air Vents on Black Background Left - First Face
// 0 Name: s\6142617ss01.dat
// 0 Author: Massimo Maso [Sirio]
// 0 !LDRAW_ORG Subpart UPDATE 2023-05
// 0 !LICENSE Licensed under CC BY 4.0 : see CAreadme.txt
// 
// 0 BFC CERTIFY CCW
  [0,"BFC","CERTIFY"],
  [0,"BFC","CCW"],
// 
// 0 !HISTORY 2023-10-31 [OrionP] Official Update 2023-05
// 
// 
// 0 // Primitives
// 1 0 -16.5 -.25 3.8922 -1.5 0 0 0 1 0 0 0 1.5 1-4chrd.dat
  [1,0,-16.5,-.25,3.8922,-1.5,0,0,0,1,0,0,0,1.5, ldraw_lib__1_4chrd()],
// 1 0 16.5 -.25 3.8922 1.5 0 0 0 1 0 0 0 1.5 1-4chrd.dat
  [1,0,16.5,-.25,3.8922,1.5,0,0,0,1,0,0,0,1.5, ldraw_lib__1_4chrd()],
// 0 // Black faces
// 4 0 -18 -.25 3.8922 18 -.25 3.8922 16.5 -.25 5.3922 -16.5 -.25 5.3922
  [4,0,-18,-.25,3.8922,18,-.25,3.8922,16.5,-.25,5.3922,-16.5,-.25,5.3922],
// 4 0 -18 -.25 3.8922 -18 -.25 -.0121 -2.75 -.25 -.0121 -2.75 -.25 .6211
  [4,0,-18,-.25,3.8922,-18,-.25,-.0121,-2.75,-.25,-.0121,-2.75,-.25,.6211],
// 4 0 18 -.25 3.8922 -18 -.25 3.8922 -2.75 -.25 .6211 15 -.25 .6211
  [4,0,18,-.25,3.8922,-18,-.25,3.8922,-2.75,-.25,.6211,15,-.25,.6211],
// 4 0 18 -.25 3.8922 15 -.25 .6211 14.4972 -.25 -.0121 18 -.25 -.0121
  [4,0,18,-.25,3.8922,15,-.25,.6211,14.4972,-.25,-.0121,18,-.25,-.0121],
// 0 // Silver faces
// 3 80 -2.75 -.25 .6211 -2.75 -.25 -.0121 -1.0028 -.25 -.0121
  [3,80,-2.75,-.25,.6211,-2.75,-.25,-.0121,-1.0028,-.25,-.0121],
// 3 80 -2.75 -.25 .6211 -1.0028 -.25 -.0121 2.2972 -.25 -.0121
  [3,80,-2.75,-.25,.6211,-1.0028,-.25,-.0121,2.2972,-.25,-.0121],
// 3 80 -2.75 -.25 .6211 2.2972 -.25 -.0121 2.8972 -.25 -.0121
  [3,80,-2.75,-.25,.6211,2.2972,-.25,-.0121,2.8972,-.25,-.0121],
// 3 80 -2.75 -.25 .6211 2.8972 -.25 -.0121 4.6972 -.25 -.0121
  [3,80,-2.75,-.25,.6211,2.8972,-.25,-.0121,4.6972,-.25,-.0121],
// 3 80 -2.75 -.25 .6211 4.6972 -.25 -.0121 7.1972 -.25 -.0121
  [3,80,-2.75,-.25,.6211,4.6972,-.25,-.0121,7.1972,-.25,-.0121],
// 4 80 -2.75 -.25 .6211 7.1972 -.25 -.0121 7.7972 -.25 -.0121 15 -.25 .6211
  [4,80,-2.75,-.25,.6211,7.1972,-.25,-.0121,7.7972,-.25,-.0121,15,-.25,.6211],
// 3 80 15 -.25 .6211 7.7972 -.25 -.0121 9.5972 -.25 -.0121
  [3,80,15,-.25,.6211,7.7972,-.25,-.0121,9.5972,-.25,-.0121],
// 3 80 15 -.25 .6211 9.5972 -.25 -.0121 12.0972 -.25 -.0121
  [3,80,15,-.25,.6211,9.5972,-.25,-.0121,12.0972,-.25,-.0121],
// 3 80 15 -.25 .6211 12.0972 -.25 -.0121 12.6972 -.25 -.0121
  [3,80,15,-.25,.6211,12.0972,-.25,-.0121,12.6972,-.25,-.0121],
// 3 80 15 -.25 .6211 12.6972 -.25 -.0121 14.4972 -.25 -.0121
  [3,80,15,-.25,.6211,12.6972,-.25,-.0121,14.4972,-.25,-.0121],
];
module ldraw_lib__s__6142617ss01(step=0, col=false, unit=2/5, alt=false, line=0.2, solid=!$preview)
    makepoly(ldraw_lib__s__6142617ss01(), step=step, col=col, unit=unit, alt=alt, line=line, solid=solid);
ldraw_lib__s__6142617ss01(line=0.2);
// file: 6142617sc01.scad
use <../lib.scad>
use <s/6142617ss01.scad>
use <s/6142617ss02.scad>
use <s/6142617ss03.scad>
use <s/6142617ss04.scad>
use <s/6142617ss05.scad>
use <s/6142617ss06.scad>
use <s/6142617ss08.scad>
function ldraw_lib__6142617sc01() = [
// 0 Sticker  1.9 x  1.8 with Silver Air Vents on Black Background Left (Formed) (Needs work)
// 0 Name: 6142617sc01.dat
// 0 Author: Massimo Maso [Sirio]
// 0 !LDRAW_ORG Part UPDATE 2023-05
// 0 !LICENSE Licensed under CC BY 4.0 : see CAreadme.txt
// 
// 0 !HELP Needs work: Some parts should be halftones.
// 0 !HELP The transition from dark grey to grey should be done less clearly.
// 
// 0 BFC CERTIFY CCW
  [0,"BFC","CERTIFY"],
  [0,"BFC","CCW"],
// 
// 0 !KEYWORDS 1969, Camaro, Chevrolet, Drag, Race, Set 75874, Speed Champions
// 0 !KEYWORDS Z/28
// 
// 0 !HISTORY 2023-10-31 [OrionP] Official Update 2023-05
// 
// 
// 1 16 0 -15.6524 12.616 1 0 0 0 .998894 -.047023 0 .047023 .998894 s\6142617ss01.dat
  [1,16,0,-15.6524,12.616,1,0,0,0,.998894,-.047023,0,.047023,.998894, ldraw_lib__s__6142617ss01()],
// 1 16 0 -15.6524 12.616 1 0 0 0 .989715 -.143056 0 .143056 .989715 s\6142617ss02.dat
  [1,16,0,-15.6524,12.616,1,0,0,0,.989715,-.143056,0,.143056,.989715, ldraw_lib__s__6142617ss02()],
// 1 16 0 -12.8827 -1.648 1 0 0 0 .971148 -.238478 0 .238478 .971148 s\6142617ss03.dat
  [1,16,0,-12.8827,-1.648,1,0,0,0,.971148,-.238478,0,.238478,.971148, ldraw_lib__s__6142617ss03()],
// 1 16 0 -12.8827 -1.648 1 0 0 0 .941616 -.336689 0 .336689 .941616 s\6142617ss04.dat
  [1,16,0,-12.8827,-1.648,1,0,0,0,.941616,-.336689,0,.336689,.941616, ldraw_lib__s__6142617ss04()],
// 1 16 0 -7.5316 -14.436 1 0 0 0 .900072 -.435742 0 .435742 .900072 s\6142617ss05.dat
  [1,16,0,-7.5316,-14.436,1,0,0,0,.900072,-.435742,0,.435742,.900072, ldraw_lib__s__6142617ss05()],
// 1 16 0 -7.5316 -14.436 1 0 0 0 .844289 -.535889 0 .535889 .844289 s\6142617ss06.dat
  [1,16,0,-7.5316,-14.436,1,0,0,0,.844289,-.535889,0,.535889,.844289, ldraw_lib__s__6142617ss06()],
// 1 16 0 0 0 1 0 0 0 1 0 0 0 1 s\6142617ss08.dat
  [1,16,0,0,0,1,0,0,0,1,0,0,0,1, ldraw_lib__s__6142617ss08()],
];
module ldraw_lib__6142617sc01(step=0, col=false, unit=2/5, alt=false, line=0.2, solid=!$preview)
    makepoly(ldraw_lib__6142617sc01(), step=step, col=col, unit=unit, alt=alt, line=line, solid=solid);
ldraw_lib__6142617sc01(line=0.2);
// main file
use <../lib.scad>
use <6142617sc01.scad>
function ldraw_lib__6142617uc01() = [
// 0 Sticker  1.8 x  1.9 with Silver Air Vents on Black Background Right (Formed) (Needs work)
// 0 Name: 6142617uc01.dat
// 0 Author: Massimo Maso [Sirio]
// 0 !LDRAW_ORG Part UPDATE 2023-05
// 0 !LICENSE Licensed under CC BY 4.0 : see CAreadme.txt
// 
// 0 !HELP Needs work: Some parts should be halftones.
// 0 !HELP The transition from dark grey to grey should be done less clearly.
// 
// 0 BFC CERTIFY CCW
  [0,"BFC","CERTIFY"],
  [0,"BFC","CCW"],
// 
// 0 !KEYWORDS 1969, Camaro, Chevrolet, Drag, Race, Set 75874, Speed Champions
// 0 !KEYWORDS Z/28
// 
// 0 !HISTORY 2023-10-31 [OrionP] Official Update 2023-05
// 
// 
// 1 16 0 0 0 -1 0 0 0 1 0 0 0 1 6142617sc01.dat
  [1,16,0,0,0,-1,0,0,0,1,0,0,0,1, ldraw_lib__6142617sc01()],
];
module ldraw_lib__6142617uc01(step=0, col=false, unit=2/5, alt=false, line=0.2, solid=!$preview)
    makepoly(ldraw_lib__6142617uc01(), step=step, col=col, unit=unit, alt=alt, line=line, solid=solid);
ldraw_lib__6142617uc01(line=0.2);
